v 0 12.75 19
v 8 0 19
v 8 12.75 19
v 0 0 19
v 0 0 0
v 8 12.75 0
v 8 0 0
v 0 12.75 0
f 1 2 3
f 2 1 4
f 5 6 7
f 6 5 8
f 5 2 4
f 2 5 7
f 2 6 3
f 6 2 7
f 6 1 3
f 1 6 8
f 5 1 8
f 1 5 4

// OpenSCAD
$fn = 64;

block_x = 8.0;
block_y = 12.75;
block_z = 19.0;

cube([block_x, block_y, block_z], center=false);
